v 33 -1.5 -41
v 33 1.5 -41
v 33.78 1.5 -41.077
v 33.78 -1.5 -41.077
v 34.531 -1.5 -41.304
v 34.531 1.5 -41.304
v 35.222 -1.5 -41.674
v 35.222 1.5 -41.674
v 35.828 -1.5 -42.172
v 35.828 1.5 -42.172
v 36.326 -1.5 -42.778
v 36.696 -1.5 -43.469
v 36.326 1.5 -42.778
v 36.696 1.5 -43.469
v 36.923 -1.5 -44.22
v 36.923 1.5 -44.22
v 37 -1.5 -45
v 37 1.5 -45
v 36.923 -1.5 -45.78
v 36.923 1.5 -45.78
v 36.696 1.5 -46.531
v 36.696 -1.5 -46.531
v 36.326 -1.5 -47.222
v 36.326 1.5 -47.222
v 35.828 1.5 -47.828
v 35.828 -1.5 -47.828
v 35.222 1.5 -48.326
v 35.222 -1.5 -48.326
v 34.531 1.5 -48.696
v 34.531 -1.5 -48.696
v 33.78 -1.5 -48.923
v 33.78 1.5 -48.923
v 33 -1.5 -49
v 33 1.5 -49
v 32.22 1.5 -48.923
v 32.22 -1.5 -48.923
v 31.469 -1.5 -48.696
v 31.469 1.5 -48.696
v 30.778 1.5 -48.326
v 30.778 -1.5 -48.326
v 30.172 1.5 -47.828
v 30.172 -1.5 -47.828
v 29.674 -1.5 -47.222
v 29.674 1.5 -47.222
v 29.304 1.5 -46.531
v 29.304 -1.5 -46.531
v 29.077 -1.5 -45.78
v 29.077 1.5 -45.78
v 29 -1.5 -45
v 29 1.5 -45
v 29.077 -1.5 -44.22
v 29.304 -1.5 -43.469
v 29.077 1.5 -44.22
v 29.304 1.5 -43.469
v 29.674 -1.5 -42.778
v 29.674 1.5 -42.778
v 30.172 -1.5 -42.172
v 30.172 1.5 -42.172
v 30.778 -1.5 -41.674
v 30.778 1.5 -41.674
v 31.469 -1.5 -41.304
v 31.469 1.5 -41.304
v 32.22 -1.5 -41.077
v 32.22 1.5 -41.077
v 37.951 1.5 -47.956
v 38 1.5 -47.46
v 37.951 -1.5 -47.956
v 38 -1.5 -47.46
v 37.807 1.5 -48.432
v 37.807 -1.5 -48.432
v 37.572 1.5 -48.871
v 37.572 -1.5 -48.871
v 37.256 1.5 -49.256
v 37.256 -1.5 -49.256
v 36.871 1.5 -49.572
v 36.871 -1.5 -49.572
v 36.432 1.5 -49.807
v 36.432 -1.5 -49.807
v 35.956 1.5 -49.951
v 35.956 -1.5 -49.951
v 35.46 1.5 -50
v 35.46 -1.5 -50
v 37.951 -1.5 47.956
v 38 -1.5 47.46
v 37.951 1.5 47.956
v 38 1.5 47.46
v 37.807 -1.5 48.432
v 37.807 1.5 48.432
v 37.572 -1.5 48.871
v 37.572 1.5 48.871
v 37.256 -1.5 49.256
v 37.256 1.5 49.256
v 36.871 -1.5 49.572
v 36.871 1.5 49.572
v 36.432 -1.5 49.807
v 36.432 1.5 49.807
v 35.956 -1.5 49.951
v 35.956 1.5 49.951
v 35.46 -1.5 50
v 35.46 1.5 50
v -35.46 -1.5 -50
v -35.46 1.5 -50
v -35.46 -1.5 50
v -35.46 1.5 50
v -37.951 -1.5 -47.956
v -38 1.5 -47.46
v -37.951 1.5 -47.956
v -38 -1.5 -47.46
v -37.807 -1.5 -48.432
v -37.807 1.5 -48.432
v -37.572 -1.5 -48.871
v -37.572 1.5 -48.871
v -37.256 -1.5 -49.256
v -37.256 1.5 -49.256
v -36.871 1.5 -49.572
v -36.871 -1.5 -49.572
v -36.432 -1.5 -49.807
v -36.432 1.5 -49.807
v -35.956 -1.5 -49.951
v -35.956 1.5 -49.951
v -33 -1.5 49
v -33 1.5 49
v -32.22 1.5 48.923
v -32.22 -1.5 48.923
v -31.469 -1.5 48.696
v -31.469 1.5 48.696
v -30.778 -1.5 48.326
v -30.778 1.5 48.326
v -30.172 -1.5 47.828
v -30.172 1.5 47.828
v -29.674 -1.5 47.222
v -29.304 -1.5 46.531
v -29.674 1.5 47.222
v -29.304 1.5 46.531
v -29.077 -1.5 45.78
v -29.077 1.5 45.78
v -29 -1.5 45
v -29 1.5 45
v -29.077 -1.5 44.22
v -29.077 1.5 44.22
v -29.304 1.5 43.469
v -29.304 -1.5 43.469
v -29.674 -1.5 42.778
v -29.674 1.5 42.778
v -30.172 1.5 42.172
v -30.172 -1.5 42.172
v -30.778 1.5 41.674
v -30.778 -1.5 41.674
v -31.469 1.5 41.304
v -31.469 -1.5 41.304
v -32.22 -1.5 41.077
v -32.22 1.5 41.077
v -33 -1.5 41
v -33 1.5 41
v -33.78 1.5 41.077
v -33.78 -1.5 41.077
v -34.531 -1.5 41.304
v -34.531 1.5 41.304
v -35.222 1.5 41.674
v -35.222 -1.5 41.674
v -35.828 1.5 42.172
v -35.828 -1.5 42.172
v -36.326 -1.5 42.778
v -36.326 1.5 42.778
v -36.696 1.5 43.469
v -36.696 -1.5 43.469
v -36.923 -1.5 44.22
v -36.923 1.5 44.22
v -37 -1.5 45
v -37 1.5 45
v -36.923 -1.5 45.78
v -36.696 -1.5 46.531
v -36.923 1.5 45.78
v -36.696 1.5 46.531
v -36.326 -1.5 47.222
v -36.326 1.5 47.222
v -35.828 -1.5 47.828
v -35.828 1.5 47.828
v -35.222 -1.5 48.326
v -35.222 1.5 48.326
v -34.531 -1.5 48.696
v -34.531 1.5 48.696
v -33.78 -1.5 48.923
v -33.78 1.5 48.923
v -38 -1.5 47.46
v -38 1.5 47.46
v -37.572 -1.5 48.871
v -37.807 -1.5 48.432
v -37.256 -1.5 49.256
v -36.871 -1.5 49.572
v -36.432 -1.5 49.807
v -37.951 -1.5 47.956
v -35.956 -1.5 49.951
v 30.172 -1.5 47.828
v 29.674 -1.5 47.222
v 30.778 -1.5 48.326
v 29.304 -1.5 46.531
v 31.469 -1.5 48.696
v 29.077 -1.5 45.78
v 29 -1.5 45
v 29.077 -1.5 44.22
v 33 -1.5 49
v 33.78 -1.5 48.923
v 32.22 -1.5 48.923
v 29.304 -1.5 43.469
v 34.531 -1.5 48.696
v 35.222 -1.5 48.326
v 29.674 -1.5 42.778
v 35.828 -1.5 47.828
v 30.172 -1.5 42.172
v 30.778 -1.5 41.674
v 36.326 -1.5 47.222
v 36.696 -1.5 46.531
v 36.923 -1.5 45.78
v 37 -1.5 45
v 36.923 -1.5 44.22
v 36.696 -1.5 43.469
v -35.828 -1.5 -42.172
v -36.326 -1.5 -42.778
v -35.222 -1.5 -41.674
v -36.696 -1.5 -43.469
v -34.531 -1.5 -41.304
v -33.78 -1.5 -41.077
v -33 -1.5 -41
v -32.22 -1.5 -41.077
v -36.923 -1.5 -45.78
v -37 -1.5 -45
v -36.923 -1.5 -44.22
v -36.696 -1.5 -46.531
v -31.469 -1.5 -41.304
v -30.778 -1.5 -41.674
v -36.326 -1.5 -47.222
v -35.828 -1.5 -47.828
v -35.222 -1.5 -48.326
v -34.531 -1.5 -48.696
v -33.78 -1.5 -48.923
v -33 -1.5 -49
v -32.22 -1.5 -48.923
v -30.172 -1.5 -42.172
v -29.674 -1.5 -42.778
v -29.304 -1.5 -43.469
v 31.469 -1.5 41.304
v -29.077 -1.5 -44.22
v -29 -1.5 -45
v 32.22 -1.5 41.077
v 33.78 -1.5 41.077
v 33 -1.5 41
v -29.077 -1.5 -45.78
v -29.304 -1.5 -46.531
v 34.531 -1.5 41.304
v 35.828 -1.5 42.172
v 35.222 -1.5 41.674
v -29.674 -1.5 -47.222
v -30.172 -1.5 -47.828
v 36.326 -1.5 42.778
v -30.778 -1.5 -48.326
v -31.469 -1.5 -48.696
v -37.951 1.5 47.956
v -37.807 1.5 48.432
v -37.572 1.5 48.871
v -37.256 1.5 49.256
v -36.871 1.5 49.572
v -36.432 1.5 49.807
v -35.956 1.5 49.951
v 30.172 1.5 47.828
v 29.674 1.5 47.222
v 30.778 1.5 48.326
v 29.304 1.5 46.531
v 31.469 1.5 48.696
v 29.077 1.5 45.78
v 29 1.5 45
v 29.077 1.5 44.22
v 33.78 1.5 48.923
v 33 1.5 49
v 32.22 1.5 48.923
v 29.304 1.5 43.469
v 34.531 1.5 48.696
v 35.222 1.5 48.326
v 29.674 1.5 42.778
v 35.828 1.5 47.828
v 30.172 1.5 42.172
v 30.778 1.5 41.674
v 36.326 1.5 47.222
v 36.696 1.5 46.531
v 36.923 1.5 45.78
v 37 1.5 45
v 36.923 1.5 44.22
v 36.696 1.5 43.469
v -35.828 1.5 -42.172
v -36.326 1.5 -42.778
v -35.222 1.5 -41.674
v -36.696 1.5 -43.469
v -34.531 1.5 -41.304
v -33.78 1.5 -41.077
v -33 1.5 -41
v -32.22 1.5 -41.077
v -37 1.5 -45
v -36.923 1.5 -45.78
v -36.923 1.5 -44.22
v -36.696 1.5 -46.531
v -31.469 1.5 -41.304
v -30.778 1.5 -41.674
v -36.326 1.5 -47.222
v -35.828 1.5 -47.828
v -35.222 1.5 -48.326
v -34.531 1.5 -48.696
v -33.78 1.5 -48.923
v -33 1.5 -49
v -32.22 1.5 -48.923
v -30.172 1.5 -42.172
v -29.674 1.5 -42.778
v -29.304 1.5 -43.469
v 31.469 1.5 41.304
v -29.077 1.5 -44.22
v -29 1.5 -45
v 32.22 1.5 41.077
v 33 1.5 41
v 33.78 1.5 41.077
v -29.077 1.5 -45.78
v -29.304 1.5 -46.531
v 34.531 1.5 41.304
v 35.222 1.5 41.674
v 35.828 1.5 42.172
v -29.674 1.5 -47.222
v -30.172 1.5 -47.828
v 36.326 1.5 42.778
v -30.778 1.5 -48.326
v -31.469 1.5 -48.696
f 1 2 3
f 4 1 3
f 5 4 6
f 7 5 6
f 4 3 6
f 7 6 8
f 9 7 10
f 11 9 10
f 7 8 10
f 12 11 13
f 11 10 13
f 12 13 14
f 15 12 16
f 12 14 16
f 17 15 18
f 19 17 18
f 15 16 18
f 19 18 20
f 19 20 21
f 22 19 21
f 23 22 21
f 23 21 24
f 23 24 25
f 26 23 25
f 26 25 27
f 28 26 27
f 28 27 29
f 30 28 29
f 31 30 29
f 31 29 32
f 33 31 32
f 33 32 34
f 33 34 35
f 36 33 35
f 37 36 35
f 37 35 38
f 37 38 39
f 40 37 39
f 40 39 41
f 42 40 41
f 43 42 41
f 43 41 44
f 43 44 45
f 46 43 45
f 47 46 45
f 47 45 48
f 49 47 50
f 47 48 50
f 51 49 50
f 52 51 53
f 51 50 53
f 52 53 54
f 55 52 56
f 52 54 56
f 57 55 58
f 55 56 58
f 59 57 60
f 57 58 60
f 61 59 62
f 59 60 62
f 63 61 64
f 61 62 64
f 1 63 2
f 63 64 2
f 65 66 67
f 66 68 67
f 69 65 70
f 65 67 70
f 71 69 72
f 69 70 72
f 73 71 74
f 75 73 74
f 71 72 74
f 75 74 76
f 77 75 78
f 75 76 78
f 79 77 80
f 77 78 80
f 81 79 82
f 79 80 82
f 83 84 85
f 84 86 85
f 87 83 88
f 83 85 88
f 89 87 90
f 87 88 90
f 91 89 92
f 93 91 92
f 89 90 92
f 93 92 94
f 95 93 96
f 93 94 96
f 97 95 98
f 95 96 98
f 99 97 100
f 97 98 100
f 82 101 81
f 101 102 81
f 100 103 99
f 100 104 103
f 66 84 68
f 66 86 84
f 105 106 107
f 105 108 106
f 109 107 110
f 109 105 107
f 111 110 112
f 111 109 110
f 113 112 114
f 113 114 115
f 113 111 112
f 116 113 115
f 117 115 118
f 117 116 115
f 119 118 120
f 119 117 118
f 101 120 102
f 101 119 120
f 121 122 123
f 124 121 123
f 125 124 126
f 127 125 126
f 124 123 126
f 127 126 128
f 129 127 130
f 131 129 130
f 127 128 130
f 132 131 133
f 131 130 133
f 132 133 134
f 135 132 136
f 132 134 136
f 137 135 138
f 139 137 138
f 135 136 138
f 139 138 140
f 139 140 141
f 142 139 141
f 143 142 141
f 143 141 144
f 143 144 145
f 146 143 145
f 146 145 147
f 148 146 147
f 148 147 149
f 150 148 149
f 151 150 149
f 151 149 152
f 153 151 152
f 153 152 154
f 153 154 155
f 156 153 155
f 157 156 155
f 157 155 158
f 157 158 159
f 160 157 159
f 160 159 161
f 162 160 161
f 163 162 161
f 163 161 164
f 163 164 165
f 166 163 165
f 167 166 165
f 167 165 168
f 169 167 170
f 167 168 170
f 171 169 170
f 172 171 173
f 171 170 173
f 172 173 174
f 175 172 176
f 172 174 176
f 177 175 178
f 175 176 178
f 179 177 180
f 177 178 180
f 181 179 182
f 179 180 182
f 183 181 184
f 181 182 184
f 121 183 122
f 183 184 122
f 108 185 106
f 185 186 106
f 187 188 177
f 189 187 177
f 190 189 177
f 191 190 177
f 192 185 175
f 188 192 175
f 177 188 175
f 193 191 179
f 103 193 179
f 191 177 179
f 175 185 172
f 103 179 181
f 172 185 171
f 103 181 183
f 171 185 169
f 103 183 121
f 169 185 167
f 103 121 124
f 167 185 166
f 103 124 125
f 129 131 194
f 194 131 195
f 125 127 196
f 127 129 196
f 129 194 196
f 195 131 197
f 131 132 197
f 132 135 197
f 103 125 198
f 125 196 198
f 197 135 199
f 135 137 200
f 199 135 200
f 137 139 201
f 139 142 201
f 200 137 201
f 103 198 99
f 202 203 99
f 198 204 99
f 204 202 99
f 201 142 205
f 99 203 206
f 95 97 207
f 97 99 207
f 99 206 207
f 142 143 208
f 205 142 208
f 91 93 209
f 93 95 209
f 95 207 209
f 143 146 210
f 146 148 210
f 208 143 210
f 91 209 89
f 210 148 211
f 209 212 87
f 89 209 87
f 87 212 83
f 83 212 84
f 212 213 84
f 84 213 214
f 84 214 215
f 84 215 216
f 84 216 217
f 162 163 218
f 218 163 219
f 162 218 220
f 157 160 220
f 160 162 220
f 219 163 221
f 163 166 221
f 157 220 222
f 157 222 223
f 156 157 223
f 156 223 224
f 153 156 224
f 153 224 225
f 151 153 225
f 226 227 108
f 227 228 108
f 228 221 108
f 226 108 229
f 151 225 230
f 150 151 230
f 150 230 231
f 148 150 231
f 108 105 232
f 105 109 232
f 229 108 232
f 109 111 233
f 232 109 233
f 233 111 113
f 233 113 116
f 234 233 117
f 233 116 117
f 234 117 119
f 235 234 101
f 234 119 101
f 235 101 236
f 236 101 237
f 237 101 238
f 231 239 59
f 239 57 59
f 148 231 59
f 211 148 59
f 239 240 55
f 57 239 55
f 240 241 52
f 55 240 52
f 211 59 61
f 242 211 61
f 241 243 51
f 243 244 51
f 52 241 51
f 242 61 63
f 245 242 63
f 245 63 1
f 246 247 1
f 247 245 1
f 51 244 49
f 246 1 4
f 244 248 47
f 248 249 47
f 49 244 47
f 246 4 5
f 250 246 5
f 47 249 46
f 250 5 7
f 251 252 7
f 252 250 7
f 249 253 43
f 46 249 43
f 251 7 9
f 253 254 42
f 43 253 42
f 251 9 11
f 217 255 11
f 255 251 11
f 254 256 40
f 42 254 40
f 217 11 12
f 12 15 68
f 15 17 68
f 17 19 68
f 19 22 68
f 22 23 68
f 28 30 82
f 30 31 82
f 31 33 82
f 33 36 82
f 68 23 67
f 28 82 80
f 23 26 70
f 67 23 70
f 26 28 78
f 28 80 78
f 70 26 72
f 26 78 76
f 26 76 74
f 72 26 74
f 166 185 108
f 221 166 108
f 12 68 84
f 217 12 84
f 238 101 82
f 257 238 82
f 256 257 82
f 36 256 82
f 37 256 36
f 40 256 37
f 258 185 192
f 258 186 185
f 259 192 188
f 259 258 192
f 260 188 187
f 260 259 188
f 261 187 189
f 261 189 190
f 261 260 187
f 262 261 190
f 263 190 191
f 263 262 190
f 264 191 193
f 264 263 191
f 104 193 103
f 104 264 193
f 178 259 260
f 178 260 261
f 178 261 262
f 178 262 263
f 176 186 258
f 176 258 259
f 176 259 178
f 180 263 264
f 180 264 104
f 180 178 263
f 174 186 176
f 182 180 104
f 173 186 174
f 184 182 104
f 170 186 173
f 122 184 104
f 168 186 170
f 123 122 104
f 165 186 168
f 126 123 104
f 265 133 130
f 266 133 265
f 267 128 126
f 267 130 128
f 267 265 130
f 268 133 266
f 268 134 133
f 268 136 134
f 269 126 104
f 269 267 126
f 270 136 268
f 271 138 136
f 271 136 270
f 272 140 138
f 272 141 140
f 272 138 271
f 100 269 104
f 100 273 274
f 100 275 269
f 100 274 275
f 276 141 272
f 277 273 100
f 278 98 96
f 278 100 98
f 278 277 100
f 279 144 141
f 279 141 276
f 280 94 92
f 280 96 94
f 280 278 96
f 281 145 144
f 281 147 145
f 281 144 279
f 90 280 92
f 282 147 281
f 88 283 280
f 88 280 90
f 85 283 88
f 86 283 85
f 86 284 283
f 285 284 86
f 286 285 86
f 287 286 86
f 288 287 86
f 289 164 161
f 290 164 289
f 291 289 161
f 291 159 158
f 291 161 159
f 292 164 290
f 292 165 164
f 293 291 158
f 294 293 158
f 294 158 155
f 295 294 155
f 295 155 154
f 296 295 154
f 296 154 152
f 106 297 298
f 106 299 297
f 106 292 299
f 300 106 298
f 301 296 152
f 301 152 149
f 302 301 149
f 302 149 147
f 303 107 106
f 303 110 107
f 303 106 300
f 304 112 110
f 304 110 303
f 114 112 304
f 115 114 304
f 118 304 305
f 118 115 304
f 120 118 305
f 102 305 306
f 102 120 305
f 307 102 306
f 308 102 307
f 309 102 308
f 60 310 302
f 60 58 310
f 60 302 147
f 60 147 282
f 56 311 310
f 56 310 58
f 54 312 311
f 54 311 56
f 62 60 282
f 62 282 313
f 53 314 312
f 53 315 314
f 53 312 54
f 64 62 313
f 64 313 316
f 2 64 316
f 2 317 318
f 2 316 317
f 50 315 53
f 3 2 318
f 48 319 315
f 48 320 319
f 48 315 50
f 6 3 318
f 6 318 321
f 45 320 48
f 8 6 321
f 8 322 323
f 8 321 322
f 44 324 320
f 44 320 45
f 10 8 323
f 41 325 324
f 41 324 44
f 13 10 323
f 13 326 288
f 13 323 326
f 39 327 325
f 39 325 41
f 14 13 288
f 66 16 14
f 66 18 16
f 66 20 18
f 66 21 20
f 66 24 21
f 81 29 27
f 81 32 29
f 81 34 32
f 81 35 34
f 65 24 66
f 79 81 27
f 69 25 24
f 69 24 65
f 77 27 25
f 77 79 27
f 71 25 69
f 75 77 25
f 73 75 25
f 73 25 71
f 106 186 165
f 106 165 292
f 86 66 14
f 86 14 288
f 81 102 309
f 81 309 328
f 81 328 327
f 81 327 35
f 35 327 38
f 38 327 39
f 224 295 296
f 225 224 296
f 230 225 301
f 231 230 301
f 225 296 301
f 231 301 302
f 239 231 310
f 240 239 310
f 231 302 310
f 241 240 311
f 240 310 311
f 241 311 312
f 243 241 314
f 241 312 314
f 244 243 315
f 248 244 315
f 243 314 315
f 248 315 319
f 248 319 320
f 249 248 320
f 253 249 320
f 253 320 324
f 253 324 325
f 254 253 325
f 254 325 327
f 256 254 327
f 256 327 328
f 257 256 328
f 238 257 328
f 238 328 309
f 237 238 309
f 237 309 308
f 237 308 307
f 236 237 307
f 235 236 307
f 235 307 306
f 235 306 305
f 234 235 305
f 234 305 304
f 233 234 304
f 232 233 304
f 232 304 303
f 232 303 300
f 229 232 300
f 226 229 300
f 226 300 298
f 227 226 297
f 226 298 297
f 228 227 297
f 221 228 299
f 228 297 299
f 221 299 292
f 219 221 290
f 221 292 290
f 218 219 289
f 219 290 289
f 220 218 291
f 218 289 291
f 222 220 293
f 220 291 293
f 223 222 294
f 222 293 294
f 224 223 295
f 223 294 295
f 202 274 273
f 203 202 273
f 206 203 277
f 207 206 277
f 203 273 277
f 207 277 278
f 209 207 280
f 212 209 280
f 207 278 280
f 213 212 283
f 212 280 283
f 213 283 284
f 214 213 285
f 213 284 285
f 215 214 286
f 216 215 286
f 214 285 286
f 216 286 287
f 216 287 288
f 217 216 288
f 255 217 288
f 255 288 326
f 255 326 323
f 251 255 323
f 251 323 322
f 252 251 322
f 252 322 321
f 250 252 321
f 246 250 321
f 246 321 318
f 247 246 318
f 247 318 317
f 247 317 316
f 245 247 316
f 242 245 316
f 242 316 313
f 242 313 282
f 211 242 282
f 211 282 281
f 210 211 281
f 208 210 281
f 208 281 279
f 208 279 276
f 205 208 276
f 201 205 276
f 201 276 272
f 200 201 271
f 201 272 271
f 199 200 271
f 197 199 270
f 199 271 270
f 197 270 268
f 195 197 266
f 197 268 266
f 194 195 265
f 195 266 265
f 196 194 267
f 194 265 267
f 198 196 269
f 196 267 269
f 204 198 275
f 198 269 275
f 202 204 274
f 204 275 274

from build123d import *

# Parameters (mm, degrees)
SKETCH1_W           = 76
SKETCH1_H           = 100
BOSS_EXTRUDE1_DEPTH = 1.5
FILLET1_R           = 2.54
SKETCH2_R           = 4
CUT_EXTRUDE1_DEPTH  = 63.872887638


with BuildPart() as part:
    # Sketch1 → Boss-Extrude1 (new, symmetric)
    with BuildSketch(Plane(origin=(0, 0, 0), x_dir=(1, 0, 0), z_dir=(0, 1, 0))):
        Rectangle(SKETCH1_W, SKETCH1_H)
    extrude(amount=BOSS_EXTRUDE1_DEPTH, both=True)

    # Fillet1
    fillet1_edges = [part.edges().sort_by_distance(p)[0] for p in [
        (38, 0, 50),
        (-38, 0, 50),
        (-38, 0, -50),
        (38, 0, -50),
    ]]
    fillet(fillet1_edges, radius=FILLET1_R)

    # Sketch2 → Cut-Extrude1 (cut, through all)
    with BuildSketch(Plane(origin=(0, 1.5, 0), x_dir=(1, 0, 0), z_dir=(0, 1, 0))):
        with Locations(Location((-33, 45, 0), (0, 0, 270))):
            Circle(SKETCH2_R)
        with Locations(Location((33, 45, 0), (0, 0, 270))):
            Circle(SKETCH2_R)
        with Locations(Location((33, -45, 0), (0, 0, 270))):
            Circle(SKETCH2_R)
        with Locations(Location((-33, -45, 0), (0, 0, 270))):
            Circle(SKETCH2_R)
    extrude(amount=-CUT_EXTRUDE1_DEPTH, mode=Mode.SUBTRACT)


solid = part.part
